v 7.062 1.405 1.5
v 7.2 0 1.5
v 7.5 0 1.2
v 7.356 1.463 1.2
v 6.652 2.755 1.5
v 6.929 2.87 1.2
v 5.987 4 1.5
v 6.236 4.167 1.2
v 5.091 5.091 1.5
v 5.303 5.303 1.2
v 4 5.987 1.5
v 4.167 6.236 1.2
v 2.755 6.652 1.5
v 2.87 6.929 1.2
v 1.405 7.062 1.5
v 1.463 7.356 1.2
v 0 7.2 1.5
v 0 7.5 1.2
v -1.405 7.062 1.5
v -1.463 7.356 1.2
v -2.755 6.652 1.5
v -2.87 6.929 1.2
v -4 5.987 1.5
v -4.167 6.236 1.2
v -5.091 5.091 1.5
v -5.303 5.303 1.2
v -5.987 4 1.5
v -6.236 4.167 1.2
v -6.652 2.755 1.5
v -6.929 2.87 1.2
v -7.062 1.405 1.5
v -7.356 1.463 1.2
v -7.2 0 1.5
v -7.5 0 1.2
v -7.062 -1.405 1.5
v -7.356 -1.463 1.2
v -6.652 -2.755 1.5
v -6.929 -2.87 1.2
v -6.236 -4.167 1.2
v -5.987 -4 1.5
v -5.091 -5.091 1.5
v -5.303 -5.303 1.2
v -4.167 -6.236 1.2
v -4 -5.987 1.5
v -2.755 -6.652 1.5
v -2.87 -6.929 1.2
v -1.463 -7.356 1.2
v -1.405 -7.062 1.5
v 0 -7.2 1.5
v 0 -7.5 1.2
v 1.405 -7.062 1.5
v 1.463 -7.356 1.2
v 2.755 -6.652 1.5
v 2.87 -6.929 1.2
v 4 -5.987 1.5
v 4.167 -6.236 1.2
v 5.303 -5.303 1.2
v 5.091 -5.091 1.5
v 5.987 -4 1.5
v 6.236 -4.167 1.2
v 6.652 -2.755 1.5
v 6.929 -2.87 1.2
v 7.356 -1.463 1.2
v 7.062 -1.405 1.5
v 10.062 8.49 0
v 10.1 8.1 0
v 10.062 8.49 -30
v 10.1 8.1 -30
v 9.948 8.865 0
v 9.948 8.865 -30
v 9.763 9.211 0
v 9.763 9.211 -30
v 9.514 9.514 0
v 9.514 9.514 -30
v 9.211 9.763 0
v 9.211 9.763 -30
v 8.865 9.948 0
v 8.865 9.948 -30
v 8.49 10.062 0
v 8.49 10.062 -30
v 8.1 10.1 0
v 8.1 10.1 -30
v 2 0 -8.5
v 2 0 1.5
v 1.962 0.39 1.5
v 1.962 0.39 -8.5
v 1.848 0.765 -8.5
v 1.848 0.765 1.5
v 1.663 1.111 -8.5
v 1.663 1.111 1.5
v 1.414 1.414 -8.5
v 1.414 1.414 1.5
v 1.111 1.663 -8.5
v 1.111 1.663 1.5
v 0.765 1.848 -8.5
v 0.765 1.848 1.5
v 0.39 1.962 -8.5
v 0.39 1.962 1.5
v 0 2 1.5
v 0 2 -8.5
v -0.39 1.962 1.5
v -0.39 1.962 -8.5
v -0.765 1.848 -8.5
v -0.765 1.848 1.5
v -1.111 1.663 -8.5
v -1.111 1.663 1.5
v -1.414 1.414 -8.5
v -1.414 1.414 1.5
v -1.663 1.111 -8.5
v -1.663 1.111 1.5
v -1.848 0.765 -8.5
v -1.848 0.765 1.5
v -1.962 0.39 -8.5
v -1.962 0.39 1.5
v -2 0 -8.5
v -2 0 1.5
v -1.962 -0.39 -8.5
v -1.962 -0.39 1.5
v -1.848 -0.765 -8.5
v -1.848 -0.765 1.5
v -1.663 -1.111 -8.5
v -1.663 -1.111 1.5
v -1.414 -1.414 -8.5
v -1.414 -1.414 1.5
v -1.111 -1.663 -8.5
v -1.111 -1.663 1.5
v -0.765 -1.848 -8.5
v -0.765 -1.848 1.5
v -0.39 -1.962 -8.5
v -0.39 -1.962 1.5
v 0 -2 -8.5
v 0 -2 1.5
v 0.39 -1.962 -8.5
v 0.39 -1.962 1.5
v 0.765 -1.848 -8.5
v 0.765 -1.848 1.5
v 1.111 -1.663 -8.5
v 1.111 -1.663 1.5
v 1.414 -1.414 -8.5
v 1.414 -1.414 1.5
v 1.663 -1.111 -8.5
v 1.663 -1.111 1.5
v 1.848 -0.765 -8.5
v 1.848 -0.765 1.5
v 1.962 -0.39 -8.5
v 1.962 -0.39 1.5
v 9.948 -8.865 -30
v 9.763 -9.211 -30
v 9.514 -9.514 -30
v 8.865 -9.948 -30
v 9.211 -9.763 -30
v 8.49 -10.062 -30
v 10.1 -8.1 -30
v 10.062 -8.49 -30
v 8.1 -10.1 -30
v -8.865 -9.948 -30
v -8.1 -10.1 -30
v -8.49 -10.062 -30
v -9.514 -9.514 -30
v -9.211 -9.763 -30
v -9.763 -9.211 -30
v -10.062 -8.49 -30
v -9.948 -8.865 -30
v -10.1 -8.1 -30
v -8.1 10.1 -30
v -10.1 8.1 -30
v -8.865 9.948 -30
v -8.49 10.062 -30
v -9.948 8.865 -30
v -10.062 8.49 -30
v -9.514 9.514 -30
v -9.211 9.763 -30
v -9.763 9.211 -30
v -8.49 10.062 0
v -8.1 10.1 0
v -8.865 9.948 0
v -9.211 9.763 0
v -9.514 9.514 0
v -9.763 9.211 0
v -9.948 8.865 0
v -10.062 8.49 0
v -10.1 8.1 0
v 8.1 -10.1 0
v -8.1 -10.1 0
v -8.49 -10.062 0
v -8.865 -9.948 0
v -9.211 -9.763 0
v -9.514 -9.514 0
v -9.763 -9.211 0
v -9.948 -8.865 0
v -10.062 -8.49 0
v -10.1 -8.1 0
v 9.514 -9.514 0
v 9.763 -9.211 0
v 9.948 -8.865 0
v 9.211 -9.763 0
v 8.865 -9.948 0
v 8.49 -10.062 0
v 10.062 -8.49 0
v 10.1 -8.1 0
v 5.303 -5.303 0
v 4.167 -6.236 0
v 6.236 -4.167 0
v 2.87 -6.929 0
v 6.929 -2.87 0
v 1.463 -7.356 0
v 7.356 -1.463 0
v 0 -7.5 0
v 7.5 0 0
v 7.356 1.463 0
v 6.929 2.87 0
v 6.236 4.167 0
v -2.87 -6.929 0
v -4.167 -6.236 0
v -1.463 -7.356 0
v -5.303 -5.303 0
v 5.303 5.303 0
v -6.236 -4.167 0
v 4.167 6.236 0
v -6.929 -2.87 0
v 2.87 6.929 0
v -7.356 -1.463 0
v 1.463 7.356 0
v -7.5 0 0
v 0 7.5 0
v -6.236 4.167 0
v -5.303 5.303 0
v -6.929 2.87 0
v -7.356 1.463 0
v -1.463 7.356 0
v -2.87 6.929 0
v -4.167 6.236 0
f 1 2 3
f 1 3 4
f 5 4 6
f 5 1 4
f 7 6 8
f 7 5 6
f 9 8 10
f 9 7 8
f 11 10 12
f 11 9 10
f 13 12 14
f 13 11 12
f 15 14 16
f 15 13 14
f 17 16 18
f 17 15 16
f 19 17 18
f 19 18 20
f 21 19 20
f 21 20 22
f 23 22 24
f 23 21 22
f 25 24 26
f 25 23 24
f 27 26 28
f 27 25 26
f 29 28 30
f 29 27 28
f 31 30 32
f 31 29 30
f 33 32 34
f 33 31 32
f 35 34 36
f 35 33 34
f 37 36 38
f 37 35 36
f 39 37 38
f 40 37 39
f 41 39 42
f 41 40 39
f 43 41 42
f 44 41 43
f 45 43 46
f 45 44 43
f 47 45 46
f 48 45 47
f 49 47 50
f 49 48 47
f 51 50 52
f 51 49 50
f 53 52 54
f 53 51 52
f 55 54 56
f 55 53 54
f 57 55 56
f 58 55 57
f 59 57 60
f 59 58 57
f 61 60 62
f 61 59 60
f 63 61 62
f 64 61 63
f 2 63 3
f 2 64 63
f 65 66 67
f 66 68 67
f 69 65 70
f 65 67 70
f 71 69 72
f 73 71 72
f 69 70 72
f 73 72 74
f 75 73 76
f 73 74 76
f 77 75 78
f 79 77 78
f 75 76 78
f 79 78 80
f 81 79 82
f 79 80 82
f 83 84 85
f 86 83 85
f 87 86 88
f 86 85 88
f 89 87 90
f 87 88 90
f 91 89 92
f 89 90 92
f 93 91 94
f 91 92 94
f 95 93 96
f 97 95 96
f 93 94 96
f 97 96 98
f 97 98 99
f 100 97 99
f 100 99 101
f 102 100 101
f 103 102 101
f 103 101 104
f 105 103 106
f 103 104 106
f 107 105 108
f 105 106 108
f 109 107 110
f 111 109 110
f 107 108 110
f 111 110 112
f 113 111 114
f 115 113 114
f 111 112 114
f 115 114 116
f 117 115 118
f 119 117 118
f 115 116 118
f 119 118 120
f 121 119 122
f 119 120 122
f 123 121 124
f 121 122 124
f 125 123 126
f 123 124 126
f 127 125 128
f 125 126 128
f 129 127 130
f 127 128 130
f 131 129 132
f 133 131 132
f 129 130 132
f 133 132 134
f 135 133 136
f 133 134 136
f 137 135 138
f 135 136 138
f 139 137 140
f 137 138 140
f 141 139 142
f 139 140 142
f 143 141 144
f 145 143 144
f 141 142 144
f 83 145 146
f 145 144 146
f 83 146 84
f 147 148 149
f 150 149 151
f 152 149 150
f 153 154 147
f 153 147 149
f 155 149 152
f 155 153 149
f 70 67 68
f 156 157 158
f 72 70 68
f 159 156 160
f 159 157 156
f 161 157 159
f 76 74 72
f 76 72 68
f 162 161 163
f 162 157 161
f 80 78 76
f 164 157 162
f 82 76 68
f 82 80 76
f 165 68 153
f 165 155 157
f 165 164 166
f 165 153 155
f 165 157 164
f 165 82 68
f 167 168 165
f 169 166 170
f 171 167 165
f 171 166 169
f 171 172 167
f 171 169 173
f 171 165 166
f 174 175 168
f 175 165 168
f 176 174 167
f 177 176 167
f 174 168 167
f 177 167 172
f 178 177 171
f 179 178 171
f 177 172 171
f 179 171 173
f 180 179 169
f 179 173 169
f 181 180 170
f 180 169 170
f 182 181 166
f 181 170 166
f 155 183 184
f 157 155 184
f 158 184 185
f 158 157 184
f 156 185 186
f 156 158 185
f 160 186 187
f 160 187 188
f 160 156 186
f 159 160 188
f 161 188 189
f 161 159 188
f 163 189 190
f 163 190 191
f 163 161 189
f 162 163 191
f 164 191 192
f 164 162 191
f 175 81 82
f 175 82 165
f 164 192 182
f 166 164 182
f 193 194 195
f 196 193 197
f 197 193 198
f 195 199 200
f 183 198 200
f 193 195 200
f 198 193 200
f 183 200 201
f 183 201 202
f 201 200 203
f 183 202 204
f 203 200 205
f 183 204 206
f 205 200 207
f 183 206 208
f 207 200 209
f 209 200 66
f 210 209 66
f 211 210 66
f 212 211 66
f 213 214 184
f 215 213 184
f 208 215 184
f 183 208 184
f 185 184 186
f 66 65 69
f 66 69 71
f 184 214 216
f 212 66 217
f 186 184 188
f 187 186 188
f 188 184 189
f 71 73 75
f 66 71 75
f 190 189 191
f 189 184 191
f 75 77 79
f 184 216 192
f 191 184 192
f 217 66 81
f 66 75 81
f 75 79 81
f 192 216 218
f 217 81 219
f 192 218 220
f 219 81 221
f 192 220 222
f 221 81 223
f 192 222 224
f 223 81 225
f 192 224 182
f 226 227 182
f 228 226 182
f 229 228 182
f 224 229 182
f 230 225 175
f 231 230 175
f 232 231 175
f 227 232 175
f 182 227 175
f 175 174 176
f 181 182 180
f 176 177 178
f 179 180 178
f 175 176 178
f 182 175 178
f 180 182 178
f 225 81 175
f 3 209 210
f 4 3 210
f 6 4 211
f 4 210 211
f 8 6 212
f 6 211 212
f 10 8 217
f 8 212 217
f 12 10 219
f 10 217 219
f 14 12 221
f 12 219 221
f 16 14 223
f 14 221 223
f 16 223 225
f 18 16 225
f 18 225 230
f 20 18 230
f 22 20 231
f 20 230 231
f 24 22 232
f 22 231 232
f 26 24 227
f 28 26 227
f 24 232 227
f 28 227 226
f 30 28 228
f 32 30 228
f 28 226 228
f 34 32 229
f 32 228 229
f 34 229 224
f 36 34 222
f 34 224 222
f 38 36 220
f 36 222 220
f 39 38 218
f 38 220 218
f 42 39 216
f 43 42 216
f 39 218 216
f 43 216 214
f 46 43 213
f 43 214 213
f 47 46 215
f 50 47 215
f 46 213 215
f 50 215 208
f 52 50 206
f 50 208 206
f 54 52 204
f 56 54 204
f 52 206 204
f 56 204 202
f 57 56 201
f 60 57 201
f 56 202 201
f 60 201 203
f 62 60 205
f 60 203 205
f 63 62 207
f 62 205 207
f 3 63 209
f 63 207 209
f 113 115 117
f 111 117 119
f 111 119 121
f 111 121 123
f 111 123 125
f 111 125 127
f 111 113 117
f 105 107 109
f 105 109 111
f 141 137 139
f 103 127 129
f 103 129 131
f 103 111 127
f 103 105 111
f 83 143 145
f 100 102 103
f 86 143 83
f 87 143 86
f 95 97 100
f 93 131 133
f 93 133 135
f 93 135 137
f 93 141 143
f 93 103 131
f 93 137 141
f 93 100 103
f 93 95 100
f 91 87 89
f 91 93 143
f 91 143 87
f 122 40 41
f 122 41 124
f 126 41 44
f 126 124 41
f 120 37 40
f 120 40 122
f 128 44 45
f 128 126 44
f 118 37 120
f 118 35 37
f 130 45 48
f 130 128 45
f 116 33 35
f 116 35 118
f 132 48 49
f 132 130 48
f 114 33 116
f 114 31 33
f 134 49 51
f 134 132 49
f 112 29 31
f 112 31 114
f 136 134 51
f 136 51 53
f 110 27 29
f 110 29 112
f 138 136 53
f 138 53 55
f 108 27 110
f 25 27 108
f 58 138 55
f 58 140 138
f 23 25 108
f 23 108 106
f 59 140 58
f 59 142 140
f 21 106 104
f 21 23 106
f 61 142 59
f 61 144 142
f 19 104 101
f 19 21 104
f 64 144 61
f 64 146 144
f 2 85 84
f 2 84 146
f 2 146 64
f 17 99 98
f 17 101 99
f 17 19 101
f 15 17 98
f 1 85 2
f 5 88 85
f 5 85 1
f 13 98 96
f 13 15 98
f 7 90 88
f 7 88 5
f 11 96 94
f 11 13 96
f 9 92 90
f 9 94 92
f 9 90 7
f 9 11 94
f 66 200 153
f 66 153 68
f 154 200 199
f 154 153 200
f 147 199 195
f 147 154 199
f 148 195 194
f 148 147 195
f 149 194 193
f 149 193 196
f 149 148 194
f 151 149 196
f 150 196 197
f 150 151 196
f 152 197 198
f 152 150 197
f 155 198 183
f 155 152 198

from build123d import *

# Parameters (mm, degrees)
ESQUISSE1_R             = 7.5
BOSS_EXTRU_1_DEPTH      = 1.5
ESQUISSE2_W             = 20.2
ESQUISSE2_H             = 20.2
BOSS_EXTRU_2_DEPTH      = 30
ESQUISSE6_R             = 2
ENL_V_MAT_EXTRU_1_DEPTH = 10
CHANFREIN1_SIZE         = 0.3
CONG_1_R                = 2


with BuildPart() as part:
    # Esquisse1 → Boss.-Extru.1 (new body)
    with BuildSketch(Plane.XY):
        Circle(ESQUISSE1_R)
    extrude(amount=BOSS_EXTRU_1_DEPTH)

    # Esquisse2 → Boss.-Extru.2 (add)
    with BuildSketch(Plane(origin=(0, 0, 0), x_dir=(-1, 0, 0), z_dir=(0, 0, -1))):
        Rectangle(ESQUISSE2_W, ESQUISSE2_H)
    extrude(amount=BOSS_EXTRU_2_DEPTH)

    # Esquisse6 → Enlèv. mat.-Extru.1 (cut)
    with BuildSketch(Plane.XY.offset(1.5)):
        Circle(ESQUISSE6_R)
    extrude(amount=-ENL_V_MAT_EXTRU_1_DEPTH, mode=Mode.SUBTRACT)

    # Chanfrein1
    chanfrein1_edges = [part.edges().sort_by_distance(p)[0] for p in [
        (-7.5, 0, 1.5),
    ]]
    chamfer(chanfrein1_edges, length=CHANFREIN1_SIZE)

    # Congé1
    cong_1_edges = [part.edges().sort_by_distance(p)[0] for p in [
        (-10.1, -10.1, -15),
        (-10.1, 10.1, -15),
        (10.1, 10.1, -15),
        (10.1, -10.1, -15),
    ]]
    fillet(cong_1_edges, radius=CONG_1_R)


solid = part.part
